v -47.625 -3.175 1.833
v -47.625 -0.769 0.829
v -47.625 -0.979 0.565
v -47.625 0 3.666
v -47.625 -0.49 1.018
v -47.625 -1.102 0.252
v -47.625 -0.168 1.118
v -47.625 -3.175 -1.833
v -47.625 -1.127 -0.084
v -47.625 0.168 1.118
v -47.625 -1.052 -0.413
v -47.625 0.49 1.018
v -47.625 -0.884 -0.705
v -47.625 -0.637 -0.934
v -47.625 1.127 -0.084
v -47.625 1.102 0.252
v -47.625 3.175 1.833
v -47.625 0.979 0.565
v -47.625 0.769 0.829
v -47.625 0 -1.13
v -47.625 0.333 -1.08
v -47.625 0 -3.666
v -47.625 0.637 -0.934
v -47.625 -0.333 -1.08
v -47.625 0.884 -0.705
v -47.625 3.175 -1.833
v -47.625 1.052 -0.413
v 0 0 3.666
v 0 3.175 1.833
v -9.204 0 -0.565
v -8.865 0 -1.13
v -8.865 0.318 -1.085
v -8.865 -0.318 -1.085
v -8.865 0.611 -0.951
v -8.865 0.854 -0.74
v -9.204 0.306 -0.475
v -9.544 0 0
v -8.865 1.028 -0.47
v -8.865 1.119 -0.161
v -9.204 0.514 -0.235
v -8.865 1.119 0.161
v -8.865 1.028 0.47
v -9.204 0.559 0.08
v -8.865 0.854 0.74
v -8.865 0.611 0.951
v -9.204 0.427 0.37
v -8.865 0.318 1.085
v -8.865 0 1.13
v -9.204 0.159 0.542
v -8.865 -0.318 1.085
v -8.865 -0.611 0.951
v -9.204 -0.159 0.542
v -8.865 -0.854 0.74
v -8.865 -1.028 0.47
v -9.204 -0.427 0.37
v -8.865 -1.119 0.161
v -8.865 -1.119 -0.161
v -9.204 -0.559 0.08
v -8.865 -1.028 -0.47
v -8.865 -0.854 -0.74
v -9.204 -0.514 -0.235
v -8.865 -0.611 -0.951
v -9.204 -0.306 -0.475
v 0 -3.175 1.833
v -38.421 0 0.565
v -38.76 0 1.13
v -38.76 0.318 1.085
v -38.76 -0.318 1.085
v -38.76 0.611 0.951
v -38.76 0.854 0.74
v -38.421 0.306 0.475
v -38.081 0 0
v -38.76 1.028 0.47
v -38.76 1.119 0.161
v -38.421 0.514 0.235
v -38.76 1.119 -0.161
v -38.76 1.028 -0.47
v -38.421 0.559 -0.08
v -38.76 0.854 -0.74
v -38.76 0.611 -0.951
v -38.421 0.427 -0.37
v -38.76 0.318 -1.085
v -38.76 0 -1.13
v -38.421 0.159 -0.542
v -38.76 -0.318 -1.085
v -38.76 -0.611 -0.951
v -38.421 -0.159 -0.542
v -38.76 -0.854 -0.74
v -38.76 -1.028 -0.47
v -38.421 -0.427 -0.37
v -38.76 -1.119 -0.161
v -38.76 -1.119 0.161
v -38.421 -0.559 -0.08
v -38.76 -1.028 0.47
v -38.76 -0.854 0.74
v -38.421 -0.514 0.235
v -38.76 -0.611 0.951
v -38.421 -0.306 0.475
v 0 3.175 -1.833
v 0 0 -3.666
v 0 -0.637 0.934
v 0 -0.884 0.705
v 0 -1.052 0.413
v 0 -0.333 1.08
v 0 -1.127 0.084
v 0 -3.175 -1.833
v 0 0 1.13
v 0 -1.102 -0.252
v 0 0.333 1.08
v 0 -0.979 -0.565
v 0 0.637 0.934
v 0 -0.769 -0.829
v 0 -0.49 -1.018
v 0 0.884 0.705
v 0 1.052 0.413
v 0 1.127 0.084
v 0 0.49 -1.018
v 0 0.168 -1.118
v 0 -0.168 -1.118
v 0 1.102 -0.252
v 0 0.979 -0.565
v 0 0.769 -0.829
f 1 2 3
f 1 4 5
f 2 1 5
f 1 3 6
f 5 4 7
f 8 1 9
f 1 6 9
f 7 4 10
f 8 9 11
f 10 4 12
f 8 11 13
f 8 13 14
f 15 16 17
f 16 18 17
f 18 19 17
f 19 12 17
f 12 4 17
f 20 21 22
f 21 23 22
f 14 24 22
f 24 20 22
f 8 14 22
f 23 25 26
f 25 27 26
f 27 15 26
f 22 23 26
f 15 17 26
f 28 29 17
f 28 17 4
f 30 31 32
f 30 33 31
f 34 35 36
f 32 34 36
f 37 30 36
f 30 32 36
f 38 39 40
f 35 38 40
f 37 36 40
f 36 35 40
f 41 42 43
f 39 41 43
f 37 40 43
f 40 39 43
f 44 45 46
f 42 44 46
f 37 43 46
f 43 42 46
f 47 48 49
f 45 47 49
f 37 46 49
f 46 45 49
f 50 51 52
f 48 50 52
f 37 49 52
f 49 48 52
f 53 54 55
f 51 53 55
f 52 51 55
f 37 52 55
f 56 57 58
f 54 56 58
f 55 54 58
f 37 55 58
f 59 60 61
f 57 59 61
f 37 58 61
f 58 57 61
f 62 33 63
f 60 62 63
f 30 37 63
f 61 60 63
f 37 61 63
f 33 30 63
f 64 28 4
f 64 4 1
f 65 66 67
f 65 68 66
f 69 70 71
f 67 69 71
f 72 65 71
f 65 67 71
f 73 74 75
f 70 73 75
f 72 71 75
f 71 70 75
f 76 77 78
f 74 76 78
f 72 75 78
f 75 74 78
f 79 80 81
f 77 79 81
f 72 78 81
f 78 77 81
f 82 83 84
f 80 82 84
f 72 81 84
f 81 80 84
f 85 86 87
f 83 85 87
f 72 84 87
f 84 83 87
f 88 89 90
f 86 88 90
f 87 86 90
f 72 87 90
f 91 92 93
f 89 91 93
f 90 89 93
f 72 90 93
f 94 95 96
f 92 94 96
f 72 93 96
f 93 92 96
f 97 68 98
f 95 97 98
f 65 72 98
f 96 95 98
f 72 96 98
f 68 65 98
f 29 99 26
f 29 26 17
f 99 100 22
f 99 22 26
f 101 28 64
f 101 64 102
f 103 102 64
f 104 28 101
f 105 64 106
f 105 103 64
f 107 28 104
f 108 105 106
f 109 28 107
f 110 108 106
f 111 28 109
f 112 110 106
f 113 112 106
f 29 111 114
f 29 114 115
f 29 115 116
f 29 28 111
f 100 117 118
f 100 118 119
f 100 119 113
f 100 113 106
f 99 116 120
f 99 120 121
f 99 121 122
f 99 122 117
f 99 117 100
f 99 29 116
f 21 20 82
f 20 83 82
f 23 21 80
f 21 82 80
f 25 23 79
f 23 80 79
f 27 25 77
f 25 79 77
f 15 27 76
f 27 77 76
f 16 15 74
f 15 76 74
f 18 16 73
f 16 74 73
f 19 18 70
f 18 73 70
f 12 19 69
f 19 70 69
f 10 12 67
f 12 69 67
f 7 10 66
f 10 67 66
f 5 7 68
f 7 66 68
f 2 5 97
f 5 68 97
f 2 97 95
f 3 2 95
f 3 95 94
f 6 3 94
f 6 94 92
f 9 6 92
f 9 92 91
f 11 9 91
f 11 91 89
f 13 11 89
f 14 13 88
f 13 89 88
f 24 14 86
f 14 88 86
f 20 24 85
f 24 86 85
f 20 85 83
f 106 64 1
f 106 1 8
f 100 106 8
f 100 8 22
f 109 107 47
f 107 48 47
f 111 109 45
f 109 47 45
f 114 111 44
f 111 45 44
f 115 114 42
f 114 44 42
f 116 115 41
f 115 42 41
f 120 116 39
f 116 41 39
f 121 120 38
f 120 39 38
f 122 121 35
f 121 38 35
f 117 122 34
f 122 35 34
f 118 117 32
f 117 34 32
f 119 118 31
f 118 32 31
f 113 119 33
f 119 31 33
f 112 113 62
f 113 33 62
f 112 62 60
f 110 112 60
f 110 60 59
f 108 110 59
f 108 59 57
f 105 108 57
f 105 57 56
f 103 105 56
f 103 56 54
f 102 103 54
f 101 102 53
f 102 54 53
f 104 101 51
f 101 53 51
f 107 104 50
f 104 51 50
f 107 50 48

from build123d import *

# Parameters (mm, degrees)
EXTRUDE1_DEPTH            = 47.625
F_4_40_TAPPED_HOLE1_D     = 2.2606
F_4_40_TAPPED_HOLE1_DEPTH = 8.8646
F_4_40_TAPPED_HOLE1_TIP   = 0.679152758
F_4_40_TAPPED_HOLE2_D     = 2.2606
F_4_40_TAPPED_HOLE2_DEPTH = 8.8646
F_4_40_TAPPED_HOLE2_TIP   = 0.679152758


with BuildPart() as part:
    # Sketch1 → Extrude1 (new body)
    with BuildSketch(Plane(origin=(0, 0, 0), x_dir=(0, 0, -1), z_dir=(1, 0, 0))):
        Polygon((3.666174209, 0), (1.833087105, 3.175), (-1.833087105, 3.175), (-3.666174209, 0), (-1.833087105, -3.175), (1.833087105, -3.175), align=None)
    extrude(amount=-EXTRUDE1_DEPTH)

    # #4-40 Tapped Hole1
    with Locations(Plane(origin=(0, 0, 0), x_dir=(0, 0, -1), z_dir=(1, 0, 0))):
        with Locations((0, 0)):
            Hole(F_4_40_TAPPED_HOLE1_D / 2, depth=F_4_40_TAPPED_HOLE1_DEPTH)
            with Locations((0, 0, -(F_4_40_TAPPED_HOLE1_DEPTH + F_4_40_TAPPED_HOLE1_TIP / 2))):  # 118° drill point
                Cone(0, F_4_40_TAPPED_HOLE1_D / 2, F_4_40_TAPPED_HOLE1_TIP, mode=Mode.SUBTRACT)

    # #4-40 Tapped Hole2
    with Locations(Plane.ZY.offset(47.625)):
        with Locations((0, 0)):
            Hole(F_4_40_TAPPED_HOLE2_D / 2, depth=F_4_40_TAPPED_HOLE2_DEPTH)
            with Locations((0, 0, -(F_4_40_TAPPED_HOLE2_DEPTH + F_4_40_TAPPED_HOLE2_TIP / 2))):  # 118° drill point
                Cone(0, F_4_40_TAPPED_HOLE2_D / 2, F_4_40_TAPPED_HOLE2_TIP, mode=Mode.SUBTRACT)


solid = part.part
